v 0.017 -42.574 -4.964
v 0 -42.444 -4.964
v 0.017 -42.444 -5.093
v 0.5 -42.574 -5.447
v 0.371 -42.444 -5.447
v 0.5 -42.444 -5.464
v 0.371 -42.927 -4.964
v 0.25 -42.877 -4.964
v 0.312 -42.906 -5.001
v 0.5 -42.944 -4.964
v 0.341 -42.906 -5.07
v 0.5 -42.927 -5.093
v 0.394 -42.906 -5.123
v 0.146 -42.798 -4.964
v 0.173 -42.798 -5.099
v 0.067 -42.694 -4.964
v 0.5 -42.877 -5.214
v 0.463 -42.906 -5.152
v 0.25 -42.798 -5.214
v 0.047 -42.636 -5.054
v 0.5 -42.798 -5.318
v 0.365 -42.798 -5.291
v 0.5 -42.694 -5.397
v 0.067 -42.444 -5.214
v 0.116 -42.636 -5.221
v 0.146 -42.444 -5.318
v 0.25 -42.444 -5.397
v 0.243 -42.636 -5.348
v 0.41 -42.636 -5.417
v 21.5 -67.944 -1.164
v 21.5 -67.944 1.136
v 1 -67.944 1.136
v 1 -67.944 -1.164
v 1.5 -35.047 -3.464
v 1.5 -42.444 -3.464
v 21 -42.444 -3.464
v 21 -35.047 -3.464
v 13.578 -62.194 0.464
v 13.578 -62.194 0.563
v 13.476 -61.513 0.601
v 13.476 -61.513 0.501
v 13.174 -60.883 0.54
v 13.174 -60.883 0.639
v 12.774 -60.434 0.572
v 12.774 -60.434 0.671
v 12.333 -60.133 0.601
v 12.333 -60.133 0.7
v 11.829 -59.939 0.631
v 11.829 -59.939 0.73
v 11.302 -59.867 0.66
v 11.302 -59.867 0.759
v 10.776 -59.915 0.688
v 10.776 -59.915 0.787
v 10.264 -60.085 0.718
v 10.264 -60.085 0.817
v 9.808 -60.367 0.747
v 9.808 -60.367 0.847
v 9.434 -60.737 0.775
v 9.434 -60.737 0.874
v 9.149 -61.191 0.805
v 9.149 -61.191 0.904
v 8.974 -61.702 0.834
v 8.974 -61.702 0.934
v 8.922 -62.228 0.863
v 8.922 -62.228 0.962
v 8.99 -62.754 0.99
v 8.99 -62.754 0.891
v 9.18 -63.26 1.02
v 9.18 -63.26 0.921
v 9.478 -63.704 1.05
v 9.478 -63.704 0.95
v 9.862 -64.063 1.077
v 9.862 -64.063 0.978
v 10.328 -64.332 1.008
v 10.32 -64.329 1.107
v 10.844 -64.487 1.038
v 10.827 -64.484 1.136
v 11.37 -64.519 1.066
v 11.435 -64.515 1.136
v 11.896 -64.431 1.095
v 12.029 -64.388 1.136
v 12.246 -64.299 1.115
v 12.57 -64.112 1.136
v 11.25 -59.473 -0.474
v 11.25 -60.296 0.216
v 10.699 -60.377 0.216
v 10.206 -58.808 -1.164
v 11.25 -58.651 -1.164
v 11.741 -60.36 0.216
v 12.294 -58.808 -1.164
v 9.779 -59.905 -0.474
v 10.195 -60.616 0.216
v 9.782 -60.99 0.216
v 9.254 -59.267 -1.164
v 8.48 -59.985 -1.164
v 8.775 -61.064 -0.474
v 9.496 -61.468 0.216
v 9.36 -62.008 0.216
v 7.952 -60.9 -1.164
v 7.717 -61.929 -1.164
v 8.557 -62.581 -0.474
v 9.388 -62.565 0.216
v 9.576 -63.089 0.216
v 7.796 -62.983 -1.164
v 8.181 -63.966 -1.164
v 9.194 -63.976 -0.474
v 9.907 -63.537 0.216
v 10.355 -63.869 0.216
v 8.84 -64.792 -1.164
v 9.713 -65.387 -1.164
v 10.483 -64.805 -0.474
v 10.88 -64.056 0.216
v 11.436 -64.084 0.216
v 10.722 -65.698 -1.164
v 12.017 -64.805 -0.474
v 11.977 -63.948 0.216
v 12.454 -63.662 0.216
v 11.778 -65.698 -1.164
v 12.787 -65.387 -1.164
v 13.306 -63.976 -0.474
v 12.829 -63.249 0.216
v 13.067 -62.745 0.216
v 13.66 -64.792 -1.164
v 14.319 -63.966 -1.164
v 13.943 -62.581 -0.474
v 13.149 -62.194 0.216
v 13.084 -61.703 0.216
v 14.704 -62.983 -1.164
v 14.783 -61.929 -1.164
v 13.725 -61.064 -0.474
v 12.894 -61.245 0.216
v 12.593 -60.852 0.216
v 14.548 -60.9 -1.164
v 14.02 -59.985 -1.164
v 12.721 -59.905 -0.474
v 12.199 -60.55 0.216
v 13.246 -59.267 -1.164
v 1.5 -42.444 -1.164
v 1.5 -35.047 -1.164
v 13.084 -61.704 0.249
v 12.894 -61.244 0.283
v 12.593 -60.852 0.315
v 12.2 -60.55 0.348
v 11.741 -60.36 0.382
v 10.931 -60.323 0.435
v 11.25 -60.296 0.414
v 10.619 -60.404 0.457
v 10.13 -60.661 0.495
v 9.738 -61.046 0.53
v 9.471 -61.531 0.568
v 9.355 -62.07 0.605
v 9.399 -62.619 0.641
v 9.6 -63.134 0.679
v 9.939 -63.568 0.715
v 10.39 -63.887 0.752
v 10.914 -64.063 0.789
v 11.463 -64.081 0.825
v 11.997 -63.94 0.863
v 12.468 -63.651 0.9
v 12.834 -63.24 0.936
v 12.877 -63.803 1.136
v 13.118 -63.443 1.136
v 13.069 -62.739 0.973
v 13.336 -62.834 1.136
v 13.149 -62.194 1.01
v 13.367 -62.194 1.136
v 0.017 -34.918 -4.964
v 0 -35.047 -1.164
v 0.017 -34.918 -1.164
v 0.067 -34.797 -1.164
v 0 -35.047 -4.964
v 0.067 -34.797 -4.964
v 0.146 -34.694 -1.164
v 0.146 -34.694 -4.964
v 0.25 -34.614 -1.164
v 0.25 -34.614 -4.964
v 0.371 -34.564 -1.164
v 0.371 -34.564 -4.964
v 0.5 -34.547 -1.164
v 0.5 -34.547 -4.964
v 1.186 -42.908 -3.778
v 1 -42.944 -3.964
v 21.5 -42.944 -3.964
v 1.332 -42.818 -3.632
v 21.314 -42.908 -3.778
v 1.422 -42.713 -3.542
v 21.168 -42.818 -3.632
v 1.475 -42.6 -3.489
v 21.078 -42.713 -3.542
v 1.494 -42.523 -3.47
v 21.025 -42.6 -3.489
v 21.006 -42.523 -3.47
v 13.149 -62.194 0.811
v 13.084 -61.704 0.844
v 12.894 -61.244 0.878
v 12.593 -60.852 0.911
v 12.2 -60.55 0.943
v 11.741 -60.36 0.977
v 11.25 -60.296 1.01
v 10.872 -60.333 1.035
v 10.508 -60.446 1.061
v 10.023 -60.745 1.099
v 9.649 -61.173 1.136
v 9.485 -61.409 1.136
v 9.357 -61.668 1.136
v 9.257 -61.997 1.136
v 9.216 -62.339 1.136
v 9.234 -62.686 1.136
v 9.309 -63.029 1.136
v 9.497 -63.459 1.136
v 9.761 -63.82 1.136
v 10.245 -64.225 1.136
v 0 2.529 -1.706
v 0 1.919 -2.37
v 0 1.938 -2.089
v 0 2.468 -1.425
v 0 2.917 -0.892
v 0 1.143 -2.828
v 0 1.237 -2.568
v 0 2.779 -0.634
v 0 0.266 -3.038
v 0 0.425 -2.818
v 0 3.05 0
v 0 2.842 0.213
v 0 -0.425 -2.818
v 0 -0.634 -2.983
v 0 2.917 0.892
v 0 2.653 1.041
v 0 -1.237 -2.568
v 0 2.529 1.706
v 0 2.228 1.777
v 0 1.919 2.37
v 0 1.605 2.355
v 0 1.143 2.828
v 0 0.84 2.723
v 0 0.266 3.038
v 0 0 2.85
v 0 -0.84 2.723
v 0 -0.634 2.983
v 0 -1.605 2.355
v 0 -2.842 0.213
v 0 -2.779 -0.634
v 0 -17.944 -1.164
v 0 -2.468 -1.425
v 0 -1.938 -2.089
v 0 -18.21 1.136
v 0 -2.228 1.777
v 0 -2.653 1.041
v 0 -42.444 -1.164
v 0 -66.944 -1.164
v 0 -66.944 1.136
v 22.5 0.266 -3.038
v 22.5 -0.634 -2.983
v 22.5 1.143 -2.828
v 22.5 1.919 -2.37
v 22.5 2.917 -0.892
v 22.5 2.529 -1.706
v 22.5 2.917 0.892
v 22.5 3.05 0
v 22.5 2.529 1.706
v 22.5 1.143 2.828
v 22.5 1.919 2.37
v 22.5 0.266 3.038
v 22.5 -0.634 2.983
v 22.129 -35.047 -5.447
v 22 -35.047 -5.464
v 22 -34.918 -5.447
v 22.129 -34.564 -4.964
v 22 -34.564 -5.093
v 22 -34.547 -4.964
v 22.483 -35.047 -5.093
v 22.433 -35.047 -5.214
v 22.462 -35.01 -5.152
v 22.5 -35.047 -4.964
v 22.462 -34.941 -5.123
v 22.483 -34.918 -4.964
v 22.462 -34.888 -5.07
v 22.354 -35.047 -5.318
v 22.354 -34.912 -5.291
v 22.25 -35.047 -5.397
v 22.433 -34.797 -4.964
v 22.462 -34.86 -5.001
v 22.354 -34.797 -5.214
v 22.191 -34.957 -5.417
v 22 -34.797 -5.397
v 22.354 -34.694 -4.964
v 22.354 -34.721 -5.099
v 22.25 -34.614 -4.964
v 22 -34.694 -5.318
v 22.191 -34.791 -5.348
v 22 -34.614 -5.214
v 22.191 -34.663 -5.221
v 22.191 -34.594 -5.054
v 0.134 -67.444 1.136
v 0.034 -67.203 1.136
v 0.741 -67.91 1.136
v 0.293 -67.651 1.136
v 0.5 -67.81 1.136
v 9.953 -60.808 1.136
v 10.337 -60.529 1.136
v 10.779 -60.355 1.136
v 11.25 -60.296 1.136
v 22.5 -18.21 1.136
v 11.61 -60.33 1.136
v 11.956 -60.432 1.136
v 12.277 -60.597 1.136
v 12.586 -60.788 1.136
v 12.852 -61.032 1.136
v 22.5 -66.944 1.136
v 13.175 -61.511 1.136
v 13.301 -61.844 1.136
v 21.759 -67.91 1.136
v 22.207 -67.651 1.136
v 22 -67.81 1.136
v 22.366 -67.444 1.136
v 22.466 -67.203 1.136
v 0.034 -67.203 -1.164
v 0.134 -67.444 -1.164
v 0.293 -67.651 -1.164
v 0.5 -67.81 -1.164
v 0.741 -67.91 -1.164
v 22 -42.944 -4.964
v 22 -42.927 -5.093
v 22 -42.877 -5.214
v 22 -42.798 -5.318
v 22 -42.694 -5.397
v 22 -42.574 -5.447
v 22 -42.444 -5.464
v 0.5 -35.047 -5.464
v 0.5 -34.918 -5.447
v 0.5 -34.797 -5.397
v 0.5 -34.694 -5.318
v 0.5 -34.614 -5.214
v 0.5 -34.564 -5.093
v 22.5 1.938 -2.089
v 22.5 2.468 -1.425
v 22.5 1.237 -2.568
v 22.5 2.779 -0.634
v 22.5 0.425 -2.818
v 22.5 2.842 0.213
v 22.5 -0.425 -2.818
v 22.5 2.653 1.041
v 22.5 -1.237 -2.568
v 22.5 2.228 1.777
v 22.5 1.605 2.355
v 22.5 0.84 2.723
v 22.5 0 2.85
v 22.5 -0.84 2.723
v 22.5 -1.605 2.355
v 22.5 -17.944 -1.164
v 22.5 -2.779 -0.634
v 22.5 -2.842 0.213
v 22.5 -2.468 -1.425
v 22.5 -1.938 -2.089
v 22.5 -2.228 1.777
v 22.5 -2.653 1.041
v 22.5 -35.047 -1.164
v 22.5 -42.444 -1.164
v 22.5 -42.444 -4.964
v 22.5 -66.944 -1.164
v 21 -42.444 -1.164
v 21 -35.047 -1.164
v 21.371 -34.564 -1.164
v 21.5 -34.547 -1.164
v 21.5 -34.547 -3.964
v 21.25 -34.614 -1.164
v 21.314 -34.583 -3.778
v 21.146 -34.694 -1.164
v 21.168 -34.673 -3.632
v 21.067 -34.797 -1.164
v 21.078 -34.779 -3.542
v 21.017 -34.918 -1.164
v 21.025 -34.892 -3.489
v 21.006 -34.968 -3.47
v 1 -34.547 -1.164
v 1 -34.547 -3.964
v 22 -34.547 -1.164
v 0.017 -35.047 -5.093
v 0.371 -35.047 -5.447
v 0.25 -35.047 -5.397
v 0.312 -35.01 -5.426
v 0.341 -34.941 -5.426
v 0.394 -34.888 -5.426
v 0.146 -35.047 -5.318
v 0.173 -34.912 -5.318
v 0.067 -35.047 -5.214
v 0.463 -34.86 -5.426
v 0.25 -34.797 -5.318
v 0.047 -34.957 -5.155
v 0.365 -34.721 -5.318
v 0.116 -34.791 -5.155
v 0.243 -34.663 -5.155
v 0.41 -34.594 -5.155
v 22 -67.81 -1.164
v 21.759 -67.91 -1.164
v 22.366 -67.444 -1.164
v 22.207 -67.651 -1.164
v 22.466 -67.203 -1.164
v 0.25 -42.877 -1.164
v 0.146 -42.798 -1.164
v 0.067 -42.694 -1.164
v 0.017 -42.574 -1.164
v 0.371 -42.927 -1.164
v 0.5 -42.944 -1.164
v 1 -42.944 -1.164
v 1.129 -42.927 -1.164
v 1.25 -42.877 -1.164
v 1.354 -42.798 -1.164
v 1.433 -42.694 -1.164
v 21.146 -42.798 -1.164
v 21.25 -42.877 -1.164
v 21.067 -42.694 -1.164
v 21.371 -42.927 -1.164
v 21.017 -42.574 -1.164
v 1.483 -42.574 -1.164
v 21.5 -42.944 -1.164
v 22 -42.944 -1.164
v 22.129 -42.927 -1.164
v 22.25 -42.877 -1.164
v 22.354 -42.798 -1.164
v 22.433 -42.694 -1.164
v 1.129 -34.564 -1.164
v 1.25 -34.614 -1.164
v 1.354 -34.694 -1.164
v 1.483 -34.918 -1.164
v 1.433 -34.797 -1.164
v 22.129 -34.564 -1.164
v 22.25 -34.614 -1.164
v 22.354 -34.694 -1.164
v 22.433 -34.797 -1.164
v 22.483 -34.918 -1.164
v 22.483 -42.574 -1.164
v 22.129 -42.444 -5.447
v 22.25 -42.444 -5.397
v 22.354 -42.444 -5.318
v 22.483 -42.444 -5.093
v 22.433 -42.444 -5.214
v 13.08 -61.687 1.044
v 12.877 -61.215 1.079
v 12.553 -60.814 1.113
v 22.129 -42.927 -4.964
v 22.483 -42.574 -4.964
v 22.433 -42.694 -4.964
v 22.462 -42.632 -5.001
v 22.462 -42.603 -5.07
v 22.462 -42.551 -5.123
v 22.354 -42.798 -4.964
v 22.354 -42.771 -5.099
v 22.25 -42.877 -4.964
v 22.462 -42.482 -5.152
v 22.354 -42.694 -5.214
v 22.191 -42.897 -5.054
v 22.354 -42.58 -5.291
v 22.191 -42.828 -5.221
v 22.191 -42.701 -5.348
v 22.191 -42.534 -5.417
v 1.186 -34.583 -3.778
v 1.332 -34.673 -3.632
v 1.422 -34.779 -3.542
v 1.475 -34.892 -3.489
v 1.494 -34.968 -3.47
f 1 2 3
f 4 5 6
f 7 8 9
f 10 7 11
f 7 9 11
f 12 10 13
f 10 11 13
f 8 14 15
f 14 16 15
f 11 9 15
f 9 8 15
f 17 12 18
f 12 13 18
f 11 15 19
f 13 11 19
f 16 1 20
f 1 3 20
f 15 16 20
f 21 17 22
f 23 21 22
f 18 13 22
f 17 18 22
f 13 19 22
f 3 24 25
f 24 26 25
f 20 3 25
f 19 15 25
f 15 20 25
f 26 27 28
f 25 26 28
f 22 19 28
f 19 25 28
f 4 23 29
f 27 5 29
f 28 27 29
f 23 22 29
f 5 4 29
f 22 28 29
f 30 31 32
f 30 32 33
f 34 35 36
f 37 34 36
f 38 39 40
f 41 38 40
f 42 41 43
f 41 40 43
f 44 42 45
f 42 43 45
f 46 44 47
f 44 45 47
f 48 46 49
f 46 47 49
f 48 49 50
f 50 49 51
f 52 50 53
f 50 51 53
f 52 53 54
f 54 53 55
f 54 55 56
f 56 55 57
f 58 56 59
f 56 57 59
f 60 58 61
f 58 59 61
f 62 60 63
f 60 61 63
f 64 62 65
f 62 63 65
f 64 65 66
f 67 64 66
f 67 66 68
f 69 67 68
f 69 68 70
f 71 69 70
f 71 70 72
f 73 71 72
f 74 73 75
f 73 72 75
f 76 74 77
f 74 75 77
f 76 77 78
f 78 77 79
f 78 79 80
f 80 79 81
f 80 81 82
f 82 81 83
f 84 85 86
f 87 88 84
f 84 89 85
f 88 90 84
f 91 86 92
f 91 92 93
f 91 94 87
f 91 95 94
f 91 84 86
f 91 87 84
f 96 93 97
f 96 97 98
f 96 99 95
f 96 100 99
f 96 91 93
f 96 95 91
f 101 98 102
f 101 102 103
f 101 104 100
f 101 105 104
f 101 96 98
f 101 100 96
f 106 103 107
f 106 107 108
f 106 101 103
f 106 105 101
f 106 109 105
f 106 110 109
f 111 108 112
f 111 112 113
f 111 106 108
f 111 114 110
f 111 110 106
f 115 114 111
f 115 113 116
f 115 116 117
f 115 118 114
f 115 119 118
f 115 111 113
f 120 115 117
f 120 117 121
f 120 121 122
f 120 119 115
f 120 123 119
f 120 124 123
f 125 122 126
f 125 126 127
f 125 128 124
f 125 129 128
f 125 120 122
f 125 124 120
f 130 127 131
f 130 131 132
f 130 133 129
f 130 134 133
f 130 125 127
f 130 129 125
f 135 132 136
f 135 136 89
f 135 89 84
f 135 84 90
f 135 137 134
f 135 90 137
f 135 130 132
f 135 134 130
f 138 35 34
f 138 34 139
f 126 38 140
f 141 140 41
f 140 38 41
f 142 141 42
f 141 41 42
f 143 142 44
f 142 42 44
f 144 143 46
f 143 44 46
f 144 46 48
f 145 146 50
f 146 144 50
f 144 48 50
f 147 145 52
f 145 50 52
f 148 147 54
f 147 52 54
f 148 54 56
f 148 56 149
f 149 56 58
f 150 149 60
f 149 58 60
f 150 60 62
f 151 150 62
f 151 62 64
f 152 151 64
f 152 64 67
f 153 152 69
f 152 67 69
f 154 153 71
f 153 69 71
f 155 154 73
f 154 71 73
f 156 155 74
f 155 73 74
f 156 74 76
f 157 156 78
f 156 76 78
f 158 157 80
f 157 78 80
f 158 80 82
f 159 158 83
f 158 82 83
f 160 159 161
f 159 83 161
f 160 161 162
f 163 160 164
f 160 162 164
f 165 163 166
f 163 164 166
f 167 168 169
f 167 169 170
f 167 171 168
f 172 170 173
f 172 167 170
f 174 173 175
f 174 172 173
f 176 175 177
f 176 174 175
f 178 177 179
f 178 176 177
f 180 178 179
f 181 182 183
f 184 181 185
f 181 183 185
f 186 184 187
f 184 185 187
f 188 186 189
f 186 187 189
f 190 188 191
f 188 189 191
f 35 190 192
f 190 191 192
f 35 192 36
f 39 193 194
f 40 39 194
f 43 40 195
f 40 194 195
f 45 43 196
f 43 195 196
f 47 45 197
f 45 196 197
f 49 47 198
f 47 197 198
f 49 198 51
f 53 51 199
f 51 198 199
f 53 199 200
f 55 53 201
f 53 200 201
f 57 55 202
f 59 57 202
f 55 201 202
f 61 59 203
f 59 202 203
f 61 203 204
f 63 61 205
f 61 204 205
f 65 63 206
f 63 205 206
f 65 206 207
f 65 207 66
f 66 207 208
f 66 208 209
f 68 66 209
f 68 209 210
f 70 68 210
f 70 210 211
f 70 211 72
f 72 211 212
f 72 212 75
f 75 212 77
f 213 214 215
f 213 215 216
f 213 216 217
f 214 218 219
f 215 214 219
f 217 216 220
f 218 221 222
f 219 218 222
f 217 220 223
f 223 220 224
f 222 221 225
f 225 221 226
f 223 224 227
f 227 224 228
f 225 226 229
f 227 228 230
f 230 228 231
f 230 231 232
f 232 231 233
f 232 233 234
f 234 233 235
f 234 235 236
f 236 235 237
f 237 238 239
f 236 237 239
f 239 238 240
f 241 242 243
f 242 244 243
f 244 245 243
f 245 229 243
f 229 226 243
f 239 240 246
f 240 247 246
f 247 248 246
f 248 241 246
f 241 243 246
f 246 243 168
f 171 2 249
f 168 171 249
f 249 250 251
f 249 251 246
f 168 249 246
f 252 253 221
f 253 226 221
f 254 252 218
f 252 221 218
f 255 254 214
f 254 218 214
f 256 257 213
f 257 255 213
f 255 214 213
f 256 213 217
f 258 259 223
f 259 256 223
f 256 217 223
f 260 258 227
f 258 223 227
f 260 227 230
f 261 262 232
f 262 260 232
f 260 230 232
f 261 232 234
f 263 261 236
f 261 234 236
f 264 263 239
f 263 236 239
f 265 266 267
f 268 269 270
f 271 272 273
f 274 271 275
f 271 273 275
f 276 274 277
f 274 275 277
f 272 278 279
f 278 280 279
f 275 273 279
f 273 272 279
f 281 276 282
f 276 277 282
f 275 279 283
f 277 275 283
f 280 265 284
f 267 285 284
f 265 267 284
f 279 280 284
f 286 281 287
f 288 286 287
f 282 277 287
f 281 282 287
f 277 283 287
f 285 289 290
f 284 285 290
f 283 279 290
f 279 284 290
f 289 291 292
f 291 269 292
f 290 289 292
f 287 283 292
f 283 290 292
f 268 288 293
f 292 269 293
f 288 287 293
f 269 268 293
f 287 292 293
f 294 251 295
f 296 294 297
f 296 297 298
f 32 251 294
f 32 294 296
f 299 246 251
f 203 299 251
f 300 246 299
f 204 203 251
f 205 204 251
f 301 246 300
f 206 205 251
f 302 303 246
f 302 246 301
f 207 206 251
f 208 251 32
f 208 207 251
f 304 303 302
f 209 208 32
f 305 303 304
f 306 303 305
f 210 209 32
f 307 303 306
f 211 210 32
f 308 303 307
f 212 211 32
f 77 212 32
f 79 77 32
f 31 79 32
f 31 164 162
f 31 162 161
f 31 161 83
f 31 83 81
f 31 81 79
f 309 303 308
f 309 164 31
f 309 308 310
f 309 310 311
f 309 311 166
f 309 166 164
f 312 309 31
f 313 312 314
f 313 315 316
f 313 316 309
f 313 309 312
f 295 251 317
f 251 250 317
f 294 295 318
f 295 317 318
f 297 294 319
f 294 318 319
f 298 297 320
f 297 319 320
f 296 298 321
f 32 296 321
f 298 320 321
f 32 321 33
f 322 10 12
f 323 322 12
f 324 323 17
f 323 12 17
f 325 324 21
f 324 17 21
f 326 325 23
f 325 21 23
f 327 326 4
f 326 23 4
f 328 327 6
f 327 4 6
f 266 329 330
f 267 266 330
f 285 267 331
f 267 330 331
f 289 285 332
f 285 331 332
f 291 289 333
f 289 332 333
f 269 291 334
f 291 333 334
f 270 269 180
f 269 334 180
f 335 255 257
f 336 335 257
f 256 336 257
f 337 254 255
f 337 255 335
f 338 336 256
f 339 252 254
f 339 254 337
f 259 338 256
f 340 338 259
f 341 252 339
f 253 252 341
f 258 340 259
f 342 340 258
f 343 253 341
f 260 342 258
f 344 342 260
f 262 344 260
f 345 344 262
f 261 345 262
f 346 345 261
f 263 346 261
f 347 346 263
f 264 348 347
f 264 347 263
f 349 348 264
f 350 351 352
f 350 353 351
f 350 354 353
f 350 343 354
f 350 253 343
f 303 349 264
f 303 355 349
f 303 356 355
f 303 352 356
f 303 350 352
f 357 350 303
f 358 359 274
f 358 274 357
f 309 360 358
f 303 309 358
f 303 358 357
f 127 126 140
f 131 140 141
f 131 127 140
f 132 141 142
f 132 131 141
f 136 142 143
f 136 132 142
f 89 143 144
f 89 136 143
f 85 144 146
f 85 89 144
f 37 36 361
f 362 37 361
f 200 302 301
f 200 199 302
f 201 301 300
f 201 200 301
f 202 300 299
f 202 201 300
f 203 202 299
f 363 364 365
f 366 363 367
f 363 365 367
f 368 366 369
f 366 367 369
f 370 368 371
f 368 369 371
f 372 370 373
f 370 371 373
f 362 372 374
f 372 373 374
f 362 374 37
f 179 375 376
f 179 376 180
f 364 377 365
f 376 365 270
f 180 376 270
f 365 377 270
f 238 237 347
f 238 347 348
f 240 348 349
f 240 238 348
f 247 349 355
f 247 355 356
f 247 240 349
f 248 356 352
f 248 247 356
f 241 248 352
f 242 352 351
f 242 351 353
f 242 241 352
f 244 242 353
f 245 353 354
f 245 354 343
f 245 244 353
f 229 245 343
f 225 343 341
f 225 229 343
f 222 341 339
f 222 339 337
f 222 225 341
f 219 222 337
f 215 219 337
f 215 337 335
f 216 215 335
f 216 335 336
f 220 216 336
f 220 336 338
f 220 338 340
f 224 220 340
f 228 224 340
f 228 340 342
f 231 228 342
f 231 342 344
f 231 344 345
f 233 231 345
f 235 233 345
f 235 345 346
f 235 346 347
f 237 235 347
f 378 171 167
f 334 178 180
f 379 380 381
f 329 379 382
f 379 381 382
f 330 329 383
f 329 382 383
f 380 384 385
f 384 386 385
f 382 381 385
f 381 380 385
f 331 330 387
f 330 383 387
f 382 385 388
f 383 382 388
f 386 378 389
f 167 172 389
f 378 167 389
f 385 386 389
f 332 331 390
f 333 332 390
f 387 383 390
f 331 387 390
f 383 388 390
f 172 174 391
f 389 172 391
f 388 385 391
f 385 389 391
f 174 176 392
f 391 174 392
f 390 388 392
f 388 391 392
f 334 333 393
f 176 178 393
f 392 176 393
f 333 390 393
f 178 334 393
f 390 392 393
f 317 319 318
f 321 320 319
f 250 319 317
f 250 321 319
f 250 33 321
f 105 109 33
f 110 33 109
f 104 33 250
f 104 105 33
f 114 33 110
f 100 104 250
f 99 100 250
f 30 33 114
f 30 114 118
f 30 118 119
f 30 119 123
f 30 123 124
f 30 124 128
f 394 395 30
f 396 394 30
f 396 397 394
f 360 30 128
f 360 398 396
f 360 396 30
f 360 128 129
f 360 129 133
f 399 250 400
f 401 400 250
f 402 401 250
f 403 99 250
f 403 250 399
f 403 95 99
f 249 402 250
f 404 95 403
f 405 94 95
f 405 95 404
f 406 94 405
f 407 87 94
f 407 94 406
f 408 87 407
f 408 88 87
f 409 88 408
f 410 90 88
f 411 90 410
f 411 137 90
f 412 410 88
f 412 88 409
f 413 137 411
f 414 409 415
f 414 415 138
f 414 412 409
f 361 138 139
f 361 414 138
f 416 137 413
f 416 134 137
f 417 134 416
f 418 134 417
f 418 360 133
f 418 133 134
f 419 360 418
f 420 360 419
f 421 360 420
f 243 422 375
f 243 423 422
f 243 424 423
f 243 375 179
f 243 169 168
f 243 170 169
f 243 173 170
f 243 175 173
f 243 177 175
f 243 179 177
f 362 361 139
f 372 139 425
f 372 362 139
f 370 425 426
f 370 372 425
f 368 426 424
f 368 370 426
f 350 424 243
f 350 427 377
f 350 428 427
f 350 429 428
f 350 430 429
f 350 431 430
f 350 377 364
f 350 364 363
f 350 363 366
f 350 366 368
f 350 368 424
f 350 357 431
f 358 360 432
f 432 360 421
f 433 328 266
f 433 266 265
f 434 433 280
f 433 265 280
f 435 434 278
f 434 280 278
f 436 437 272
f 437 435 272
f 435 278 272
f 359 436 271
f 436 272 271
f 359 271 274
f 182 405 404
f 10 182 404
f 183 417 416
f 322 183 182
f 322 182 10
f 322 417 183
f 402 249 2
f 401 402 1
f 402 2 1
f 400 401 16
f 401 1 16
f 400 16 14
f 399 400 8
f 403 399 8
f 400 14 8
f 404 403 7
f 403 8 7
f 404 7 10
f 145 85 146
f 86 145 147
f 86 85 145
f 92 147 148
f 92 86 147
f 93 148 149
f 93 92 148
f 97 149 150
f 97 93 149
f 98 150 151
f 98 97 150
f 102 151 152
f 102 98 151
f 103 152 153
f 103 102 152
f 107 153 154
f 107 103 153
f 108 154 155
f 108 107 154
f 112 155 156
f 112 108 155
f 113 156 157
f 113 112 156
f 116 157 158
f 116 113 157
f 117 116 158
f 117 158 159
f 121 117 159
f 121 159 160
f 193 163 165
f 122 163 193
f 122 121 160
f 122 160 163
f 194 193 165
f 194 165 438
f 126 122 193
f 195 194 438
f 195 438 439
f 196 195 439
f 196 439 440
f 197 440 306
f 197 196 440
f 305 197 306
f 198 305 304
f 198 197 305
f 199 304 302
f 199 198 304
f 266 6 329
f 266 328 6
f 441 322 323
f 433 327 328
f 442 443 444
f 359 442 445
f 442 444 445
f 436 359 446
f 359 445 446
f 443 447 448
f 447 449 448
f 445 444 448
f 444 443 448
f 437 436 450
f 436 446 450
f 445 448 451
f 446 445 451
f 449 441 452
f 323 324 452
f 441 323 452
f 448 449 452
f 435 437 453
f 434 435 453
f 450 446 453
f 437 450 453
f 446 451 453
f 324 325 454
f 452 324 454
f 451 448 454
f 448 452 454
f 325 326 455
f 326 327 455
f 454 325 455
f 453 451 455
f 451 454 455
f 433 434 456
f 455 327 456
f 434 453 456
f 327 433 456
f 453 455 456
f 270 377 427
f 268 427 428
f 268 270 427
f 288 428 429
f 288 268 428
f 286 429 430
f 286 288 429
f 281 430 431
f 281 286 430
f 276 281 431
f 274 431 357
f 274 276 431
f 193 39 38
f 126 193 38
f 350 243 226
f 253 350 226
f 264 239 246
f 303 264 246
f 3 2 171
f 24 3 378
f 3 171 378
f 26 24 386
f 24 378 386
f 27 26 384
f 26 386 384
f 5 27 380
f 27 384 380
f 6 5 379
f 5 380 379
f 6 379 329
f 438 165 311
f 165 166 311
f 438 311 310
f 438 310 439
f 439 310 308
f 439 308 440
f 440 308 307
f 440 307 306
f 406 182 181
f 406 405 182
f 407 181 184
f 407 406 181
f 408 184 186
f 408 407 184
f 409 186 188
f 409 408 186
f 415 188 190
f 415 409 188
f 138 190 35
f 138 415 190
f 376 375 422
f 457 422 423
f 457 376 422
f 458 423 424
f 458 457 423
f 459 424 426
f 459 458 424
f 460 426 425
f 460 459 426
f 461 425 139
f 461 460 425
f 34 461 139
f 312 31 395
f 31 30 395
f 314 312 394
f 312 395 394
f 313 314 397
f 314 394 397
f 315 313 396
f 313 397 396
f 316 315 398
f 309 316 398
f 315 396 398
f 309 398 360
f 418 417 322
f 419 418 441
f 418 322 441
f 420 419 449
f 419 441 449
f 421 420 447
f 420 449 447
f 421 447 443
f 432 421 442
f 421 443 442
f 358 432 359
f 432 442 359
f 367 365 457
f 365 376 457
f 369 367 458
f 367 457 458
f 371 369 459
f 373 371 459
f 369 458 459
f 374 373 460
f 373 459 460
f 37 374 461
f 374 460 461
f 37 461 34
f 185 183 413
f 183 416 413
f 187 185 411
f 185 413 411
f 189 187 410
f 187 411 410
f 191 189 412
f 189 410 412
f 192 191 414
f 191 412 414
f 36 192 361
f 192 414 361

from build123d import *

# Parameters (mm, degrees)
SKETCH1_R           = 3.05
SKETCH1_R_2         = 2.85
BOSS_EXTRUDE1_DEPTH = 22.5
THREAD1_PITCH       = 0.79375
CUT_EXTRUDE1_REACH  = 73.638
SKETCH12_R          = 2.85
SKETCH13_W          = 4.3
SKETCH13_H          = 8.396908484
BOSS_EXTRUDE2_DEPTH = 22.5
CUT_EXTRUDE2_REACH  = 53.493
SKETCH14_W          = 19.5
SKETCH14_H          = 2.3
FILLET1_R           = 1
FILLET2_R           = 0.5


with BuildPart() as part:
    # Sketch1 → Boss-Extrude1 (new body)
    with BuildSketch(Plane(origin=(0, 0, 0), x_dir=(0, 0, -1), z_dir=(1, 0, 0))):
        with Locations(Location((0, 0, 0), (0, 0, 180))):
            Circle(SKETCH1_R)
        with Locations(Location((0, 0, 0), (0, 0, 180))):
            Circle(SKETCH1_R_2, mode=Mode.SUBTRACT)
    extrude(amount=BOSS_EXTRUDE1_DEPTH)

    # Sweep1: sweep along a path in Sketch4
    with BuildLine(Plane(origin=(0, -2.85, 0), x_dir=(-1, 0, 0), z_dir=(0, -1, 0))) as sweep1_path:
        Line((0, 0), (-22.5, 0))
    # Sketch3 → Sweep1 (sweep)
    with BuildSketch(Plane(origin=(0, 0, 0), x_dir=(0, 0, -1), z_dir=(1, 0, 0))):
        Polygon((-3.05, 0), (3.05, 0), (1.163985807, -17.9442264), (1.163985807, -67.9442264), (-1.136014193, -67.9442264), (-1.136014193, -18.210358526), align=None)
    sweep(path=sweep1_path.line)

    # Sketch7 → CSK for #6 Flat Head Machine Screw (100)1 (revolve, cut)
    with BuildSketch(Plane(origin=(11.25, -62.1942264, -1.163985807), x_dir=(0, 1, 0), z_dir=(1, 0, 0))):
        Polygon((0, 0), (0, 2.3), (1.89865, 2.3), (1.89865, 1.380025208), (3.5433, 0), align=None)
    revolve(axis=Axis((11.25, -62.1942264, -7.513985807), (0, 0, 1)), mode=Mode.SUBTRACT)

    # Thread1: the profile of Thread Profile1 profile screwed along a right-hand helix of 1.159023 turns, 8 arcs to a turn; built about Z, then put on its axis
    thread1_z = Axis((0, 0, 0), (0, 0, 1))
    thread1_corners = [(1.89835, 0, -0.000173205), (2.328279788, 0, 0.248046874), (2.328279788, 0, 0.347265624), (1.89835, 0, 0.595485703)]
    with BuildLine(mode=Mode.PRIVATE) as thread1_profile:
        Line(thread1_corners[0], thread1_corners[1])
        Line(thread1_corners[1], thread1_corners[2])
        Line(thread1_corners[2], thread1_corners[3])
        Line(thread1_corners[3], thread1_corners[0])
    thread1_cap = Face(thread1_profile.wire())
    thread1_turn_angles = [0, 22.5, 45, 67.5, 90, 112.5, 135, 157.5, 180, 202.5, 225, 247.5, 270, 292.5, 315, 337.5, 360]
    thread1_turn_weights = [1, 0.9238795325112867, 1, 0.9238795325112867, 1, 0.9238795325112867, 1, 0.9238795325112867, 1, 0.9238795325112867, 1, 0.9238795325112867, 1, 0.9238795325112867, 1, 0.9238795325112867, 1]
    thread1_turn_rails = [Edge.make_bspline([Vector(p[0], p[1], 0).rotate(thread1_z, thread1_turn_angles[k]) / thread1_turn_weights[k] + Vector(0, 0, p[2] + THREAD1_PITCH * thread1_turn_angles[k] / 360) for k in range(17)], [0, 0, 0, 1, 1, 2, 2, 3, 3, 4, 4, 5, 5, 6, 6, 7, 7, 8, 8, 8], 2, thread1_turn_weights) for p in thread1_corners]
    thread1_turn_sides = [Face.make_surface_from_curves(thread1_turn_rails[p[0]], thread1_turn_rails[p[1]]) for p in [(0, 1), (1, 2), (2, 3), (3, 0)]]
    thread1_last_angles = [360, 382.5, 405, 411.124204706, 417.248409411]
    thread1_last_weights = [1, 0.9238795325112867, 1, 0.9942929639578036, 1]
    thread1_last_rails = [Edge.make_bspline([Vector(p[0], p[1], 0).rotate(thread1_z, thread1_last_angles[k]) / thread1_last_weights[k] + Vector(0, 0, p[2] + THREAD1_PITCH * thread1_last_angles[k] / 360) for k in range(5)], [0, 0, 0, 1, 1, 2, 2, 2], 2, thread1_last_weights) for p in thread1_corners]
    thread1_last_sides = [Face.make_surface_from_curves(thread1_last_rails[p[0]], thread1_last_rails[p[1]]) for p in [(0, 1), (1, 2), (2, 3), (3, 0)]]
    thread1 = Plane(origin=(11.25, -62.1942264, 0.216039402), x_dir=(1, 0, 0), z_dir=(0, 0, 1)) * Solid(Shell([*thread1_turn_sides, *thread1_last_sides, thread1_cap, thread1_cap.rotate(thread1_z, 417.248409411).moved(Location((0, 0, THREAD1_PITCH * 417.248409411 / 360)))]))
    add(thread1, mode=Mode.SUBTRACT)

    # Sketch12 → Cut-Extrude1 (cut, up to next)
    with BuildSketch(Plane(origin=(22.5, 0, 0), x_dir=(0, 0, -1), z_dir=(1, 0, 0)), mode=Mode.PRIVATE) as cut_extrude1_sk1:
        with Locations(Location((0, 0, 0), (0, 0, 180))):
            Circle(SKETCH12_R)
    cut_extrude1_tool1 = extrude(cut_extrude1_sk1.sketch, amount=-CUT_EXTRUDE1_REACH, mode=Mode.PRIVATE) & part.part
    add(cut_extrude1_tool1.solids().sort_by_distance((22.5, 0, 0))[0], mode=Mode.SUBTRACT)

    # Sketch13 → Boss-Extrude2 (add)
    with BuildSketch(Plane(origin=(22.5, 0, 0), x_dir=(0, 0, -1), z_dir=(1, 0, 0))):
        with Locations((3.313985807, -38.745772158)):
            Rectangle(SKETCH13_W, SKETCH13_H)
    extrude(amount=-BOSS_EXTRUDE2_DEPTH)

    # Sketch14 → Cut-Extrude2 (cut, up to next)
    with BuildSketch(Plane.XZ.offset(42.9442264), mode=Mode.PRIVATE) as cut_extrude2_sk1:
        with Locations((11.25, -2.313985807)):
            Rectangle(SKETCH14_W, SKETCH14_H)
    cut_extrude2_tool1 = extrude(cut_extrude2_sk1.sketch, amount=-CUT_EXTRUDE2_REACH, mode=Mode.PRIVATE) & part.part
    add(cut_extrude2_tool1.solids().sort_by_distance((11.25, -42.944226, -2.313986))[0], mode=Mode.SUBTRACT)

    # Fillet1
    fillet1_edges = [part.edges().sort_by_distance(p)[0] for p in [
        (22.5, -67.9442264, -0.013985807),
        (0, -67.9442264, -0.013985807),
    ]]
    fillet(fillet1_edges, radius=FILLET1_R)

    # Fillet2
    fillet2_edges = [part.edges().sort_by_distance(p)[0] for p in [
        (0, -34.547317916, -3.313985807),
        (0, -38.745772158, -5.463985807),
        (11.25, -34.547317916, -5.463985807),
        (0, -42.9442264, -3.313985807),
        (11.25, -42.9442264, -5.463985807),
        (22.5, -42.9442264, -3.313985807),
        (22.5, -38.745772158, -5.463985807),
        (22.5, -34.547317916, -3.313985807),
        (1.5, -42.9442264, -2.313985807),
        (11.25, -42.9442264, -3.463985807),
        (21, -42.9442264, -2.313985807),
        (11.25, -34.547317916, -3.463985807),
        (21, -34.547317916, -2.313985807),
        (1.5, -34.547317916, -2.313985807),
    ]]
    fillet(fillet2_edges, radius=FILLET2_R)


solid = part.part
